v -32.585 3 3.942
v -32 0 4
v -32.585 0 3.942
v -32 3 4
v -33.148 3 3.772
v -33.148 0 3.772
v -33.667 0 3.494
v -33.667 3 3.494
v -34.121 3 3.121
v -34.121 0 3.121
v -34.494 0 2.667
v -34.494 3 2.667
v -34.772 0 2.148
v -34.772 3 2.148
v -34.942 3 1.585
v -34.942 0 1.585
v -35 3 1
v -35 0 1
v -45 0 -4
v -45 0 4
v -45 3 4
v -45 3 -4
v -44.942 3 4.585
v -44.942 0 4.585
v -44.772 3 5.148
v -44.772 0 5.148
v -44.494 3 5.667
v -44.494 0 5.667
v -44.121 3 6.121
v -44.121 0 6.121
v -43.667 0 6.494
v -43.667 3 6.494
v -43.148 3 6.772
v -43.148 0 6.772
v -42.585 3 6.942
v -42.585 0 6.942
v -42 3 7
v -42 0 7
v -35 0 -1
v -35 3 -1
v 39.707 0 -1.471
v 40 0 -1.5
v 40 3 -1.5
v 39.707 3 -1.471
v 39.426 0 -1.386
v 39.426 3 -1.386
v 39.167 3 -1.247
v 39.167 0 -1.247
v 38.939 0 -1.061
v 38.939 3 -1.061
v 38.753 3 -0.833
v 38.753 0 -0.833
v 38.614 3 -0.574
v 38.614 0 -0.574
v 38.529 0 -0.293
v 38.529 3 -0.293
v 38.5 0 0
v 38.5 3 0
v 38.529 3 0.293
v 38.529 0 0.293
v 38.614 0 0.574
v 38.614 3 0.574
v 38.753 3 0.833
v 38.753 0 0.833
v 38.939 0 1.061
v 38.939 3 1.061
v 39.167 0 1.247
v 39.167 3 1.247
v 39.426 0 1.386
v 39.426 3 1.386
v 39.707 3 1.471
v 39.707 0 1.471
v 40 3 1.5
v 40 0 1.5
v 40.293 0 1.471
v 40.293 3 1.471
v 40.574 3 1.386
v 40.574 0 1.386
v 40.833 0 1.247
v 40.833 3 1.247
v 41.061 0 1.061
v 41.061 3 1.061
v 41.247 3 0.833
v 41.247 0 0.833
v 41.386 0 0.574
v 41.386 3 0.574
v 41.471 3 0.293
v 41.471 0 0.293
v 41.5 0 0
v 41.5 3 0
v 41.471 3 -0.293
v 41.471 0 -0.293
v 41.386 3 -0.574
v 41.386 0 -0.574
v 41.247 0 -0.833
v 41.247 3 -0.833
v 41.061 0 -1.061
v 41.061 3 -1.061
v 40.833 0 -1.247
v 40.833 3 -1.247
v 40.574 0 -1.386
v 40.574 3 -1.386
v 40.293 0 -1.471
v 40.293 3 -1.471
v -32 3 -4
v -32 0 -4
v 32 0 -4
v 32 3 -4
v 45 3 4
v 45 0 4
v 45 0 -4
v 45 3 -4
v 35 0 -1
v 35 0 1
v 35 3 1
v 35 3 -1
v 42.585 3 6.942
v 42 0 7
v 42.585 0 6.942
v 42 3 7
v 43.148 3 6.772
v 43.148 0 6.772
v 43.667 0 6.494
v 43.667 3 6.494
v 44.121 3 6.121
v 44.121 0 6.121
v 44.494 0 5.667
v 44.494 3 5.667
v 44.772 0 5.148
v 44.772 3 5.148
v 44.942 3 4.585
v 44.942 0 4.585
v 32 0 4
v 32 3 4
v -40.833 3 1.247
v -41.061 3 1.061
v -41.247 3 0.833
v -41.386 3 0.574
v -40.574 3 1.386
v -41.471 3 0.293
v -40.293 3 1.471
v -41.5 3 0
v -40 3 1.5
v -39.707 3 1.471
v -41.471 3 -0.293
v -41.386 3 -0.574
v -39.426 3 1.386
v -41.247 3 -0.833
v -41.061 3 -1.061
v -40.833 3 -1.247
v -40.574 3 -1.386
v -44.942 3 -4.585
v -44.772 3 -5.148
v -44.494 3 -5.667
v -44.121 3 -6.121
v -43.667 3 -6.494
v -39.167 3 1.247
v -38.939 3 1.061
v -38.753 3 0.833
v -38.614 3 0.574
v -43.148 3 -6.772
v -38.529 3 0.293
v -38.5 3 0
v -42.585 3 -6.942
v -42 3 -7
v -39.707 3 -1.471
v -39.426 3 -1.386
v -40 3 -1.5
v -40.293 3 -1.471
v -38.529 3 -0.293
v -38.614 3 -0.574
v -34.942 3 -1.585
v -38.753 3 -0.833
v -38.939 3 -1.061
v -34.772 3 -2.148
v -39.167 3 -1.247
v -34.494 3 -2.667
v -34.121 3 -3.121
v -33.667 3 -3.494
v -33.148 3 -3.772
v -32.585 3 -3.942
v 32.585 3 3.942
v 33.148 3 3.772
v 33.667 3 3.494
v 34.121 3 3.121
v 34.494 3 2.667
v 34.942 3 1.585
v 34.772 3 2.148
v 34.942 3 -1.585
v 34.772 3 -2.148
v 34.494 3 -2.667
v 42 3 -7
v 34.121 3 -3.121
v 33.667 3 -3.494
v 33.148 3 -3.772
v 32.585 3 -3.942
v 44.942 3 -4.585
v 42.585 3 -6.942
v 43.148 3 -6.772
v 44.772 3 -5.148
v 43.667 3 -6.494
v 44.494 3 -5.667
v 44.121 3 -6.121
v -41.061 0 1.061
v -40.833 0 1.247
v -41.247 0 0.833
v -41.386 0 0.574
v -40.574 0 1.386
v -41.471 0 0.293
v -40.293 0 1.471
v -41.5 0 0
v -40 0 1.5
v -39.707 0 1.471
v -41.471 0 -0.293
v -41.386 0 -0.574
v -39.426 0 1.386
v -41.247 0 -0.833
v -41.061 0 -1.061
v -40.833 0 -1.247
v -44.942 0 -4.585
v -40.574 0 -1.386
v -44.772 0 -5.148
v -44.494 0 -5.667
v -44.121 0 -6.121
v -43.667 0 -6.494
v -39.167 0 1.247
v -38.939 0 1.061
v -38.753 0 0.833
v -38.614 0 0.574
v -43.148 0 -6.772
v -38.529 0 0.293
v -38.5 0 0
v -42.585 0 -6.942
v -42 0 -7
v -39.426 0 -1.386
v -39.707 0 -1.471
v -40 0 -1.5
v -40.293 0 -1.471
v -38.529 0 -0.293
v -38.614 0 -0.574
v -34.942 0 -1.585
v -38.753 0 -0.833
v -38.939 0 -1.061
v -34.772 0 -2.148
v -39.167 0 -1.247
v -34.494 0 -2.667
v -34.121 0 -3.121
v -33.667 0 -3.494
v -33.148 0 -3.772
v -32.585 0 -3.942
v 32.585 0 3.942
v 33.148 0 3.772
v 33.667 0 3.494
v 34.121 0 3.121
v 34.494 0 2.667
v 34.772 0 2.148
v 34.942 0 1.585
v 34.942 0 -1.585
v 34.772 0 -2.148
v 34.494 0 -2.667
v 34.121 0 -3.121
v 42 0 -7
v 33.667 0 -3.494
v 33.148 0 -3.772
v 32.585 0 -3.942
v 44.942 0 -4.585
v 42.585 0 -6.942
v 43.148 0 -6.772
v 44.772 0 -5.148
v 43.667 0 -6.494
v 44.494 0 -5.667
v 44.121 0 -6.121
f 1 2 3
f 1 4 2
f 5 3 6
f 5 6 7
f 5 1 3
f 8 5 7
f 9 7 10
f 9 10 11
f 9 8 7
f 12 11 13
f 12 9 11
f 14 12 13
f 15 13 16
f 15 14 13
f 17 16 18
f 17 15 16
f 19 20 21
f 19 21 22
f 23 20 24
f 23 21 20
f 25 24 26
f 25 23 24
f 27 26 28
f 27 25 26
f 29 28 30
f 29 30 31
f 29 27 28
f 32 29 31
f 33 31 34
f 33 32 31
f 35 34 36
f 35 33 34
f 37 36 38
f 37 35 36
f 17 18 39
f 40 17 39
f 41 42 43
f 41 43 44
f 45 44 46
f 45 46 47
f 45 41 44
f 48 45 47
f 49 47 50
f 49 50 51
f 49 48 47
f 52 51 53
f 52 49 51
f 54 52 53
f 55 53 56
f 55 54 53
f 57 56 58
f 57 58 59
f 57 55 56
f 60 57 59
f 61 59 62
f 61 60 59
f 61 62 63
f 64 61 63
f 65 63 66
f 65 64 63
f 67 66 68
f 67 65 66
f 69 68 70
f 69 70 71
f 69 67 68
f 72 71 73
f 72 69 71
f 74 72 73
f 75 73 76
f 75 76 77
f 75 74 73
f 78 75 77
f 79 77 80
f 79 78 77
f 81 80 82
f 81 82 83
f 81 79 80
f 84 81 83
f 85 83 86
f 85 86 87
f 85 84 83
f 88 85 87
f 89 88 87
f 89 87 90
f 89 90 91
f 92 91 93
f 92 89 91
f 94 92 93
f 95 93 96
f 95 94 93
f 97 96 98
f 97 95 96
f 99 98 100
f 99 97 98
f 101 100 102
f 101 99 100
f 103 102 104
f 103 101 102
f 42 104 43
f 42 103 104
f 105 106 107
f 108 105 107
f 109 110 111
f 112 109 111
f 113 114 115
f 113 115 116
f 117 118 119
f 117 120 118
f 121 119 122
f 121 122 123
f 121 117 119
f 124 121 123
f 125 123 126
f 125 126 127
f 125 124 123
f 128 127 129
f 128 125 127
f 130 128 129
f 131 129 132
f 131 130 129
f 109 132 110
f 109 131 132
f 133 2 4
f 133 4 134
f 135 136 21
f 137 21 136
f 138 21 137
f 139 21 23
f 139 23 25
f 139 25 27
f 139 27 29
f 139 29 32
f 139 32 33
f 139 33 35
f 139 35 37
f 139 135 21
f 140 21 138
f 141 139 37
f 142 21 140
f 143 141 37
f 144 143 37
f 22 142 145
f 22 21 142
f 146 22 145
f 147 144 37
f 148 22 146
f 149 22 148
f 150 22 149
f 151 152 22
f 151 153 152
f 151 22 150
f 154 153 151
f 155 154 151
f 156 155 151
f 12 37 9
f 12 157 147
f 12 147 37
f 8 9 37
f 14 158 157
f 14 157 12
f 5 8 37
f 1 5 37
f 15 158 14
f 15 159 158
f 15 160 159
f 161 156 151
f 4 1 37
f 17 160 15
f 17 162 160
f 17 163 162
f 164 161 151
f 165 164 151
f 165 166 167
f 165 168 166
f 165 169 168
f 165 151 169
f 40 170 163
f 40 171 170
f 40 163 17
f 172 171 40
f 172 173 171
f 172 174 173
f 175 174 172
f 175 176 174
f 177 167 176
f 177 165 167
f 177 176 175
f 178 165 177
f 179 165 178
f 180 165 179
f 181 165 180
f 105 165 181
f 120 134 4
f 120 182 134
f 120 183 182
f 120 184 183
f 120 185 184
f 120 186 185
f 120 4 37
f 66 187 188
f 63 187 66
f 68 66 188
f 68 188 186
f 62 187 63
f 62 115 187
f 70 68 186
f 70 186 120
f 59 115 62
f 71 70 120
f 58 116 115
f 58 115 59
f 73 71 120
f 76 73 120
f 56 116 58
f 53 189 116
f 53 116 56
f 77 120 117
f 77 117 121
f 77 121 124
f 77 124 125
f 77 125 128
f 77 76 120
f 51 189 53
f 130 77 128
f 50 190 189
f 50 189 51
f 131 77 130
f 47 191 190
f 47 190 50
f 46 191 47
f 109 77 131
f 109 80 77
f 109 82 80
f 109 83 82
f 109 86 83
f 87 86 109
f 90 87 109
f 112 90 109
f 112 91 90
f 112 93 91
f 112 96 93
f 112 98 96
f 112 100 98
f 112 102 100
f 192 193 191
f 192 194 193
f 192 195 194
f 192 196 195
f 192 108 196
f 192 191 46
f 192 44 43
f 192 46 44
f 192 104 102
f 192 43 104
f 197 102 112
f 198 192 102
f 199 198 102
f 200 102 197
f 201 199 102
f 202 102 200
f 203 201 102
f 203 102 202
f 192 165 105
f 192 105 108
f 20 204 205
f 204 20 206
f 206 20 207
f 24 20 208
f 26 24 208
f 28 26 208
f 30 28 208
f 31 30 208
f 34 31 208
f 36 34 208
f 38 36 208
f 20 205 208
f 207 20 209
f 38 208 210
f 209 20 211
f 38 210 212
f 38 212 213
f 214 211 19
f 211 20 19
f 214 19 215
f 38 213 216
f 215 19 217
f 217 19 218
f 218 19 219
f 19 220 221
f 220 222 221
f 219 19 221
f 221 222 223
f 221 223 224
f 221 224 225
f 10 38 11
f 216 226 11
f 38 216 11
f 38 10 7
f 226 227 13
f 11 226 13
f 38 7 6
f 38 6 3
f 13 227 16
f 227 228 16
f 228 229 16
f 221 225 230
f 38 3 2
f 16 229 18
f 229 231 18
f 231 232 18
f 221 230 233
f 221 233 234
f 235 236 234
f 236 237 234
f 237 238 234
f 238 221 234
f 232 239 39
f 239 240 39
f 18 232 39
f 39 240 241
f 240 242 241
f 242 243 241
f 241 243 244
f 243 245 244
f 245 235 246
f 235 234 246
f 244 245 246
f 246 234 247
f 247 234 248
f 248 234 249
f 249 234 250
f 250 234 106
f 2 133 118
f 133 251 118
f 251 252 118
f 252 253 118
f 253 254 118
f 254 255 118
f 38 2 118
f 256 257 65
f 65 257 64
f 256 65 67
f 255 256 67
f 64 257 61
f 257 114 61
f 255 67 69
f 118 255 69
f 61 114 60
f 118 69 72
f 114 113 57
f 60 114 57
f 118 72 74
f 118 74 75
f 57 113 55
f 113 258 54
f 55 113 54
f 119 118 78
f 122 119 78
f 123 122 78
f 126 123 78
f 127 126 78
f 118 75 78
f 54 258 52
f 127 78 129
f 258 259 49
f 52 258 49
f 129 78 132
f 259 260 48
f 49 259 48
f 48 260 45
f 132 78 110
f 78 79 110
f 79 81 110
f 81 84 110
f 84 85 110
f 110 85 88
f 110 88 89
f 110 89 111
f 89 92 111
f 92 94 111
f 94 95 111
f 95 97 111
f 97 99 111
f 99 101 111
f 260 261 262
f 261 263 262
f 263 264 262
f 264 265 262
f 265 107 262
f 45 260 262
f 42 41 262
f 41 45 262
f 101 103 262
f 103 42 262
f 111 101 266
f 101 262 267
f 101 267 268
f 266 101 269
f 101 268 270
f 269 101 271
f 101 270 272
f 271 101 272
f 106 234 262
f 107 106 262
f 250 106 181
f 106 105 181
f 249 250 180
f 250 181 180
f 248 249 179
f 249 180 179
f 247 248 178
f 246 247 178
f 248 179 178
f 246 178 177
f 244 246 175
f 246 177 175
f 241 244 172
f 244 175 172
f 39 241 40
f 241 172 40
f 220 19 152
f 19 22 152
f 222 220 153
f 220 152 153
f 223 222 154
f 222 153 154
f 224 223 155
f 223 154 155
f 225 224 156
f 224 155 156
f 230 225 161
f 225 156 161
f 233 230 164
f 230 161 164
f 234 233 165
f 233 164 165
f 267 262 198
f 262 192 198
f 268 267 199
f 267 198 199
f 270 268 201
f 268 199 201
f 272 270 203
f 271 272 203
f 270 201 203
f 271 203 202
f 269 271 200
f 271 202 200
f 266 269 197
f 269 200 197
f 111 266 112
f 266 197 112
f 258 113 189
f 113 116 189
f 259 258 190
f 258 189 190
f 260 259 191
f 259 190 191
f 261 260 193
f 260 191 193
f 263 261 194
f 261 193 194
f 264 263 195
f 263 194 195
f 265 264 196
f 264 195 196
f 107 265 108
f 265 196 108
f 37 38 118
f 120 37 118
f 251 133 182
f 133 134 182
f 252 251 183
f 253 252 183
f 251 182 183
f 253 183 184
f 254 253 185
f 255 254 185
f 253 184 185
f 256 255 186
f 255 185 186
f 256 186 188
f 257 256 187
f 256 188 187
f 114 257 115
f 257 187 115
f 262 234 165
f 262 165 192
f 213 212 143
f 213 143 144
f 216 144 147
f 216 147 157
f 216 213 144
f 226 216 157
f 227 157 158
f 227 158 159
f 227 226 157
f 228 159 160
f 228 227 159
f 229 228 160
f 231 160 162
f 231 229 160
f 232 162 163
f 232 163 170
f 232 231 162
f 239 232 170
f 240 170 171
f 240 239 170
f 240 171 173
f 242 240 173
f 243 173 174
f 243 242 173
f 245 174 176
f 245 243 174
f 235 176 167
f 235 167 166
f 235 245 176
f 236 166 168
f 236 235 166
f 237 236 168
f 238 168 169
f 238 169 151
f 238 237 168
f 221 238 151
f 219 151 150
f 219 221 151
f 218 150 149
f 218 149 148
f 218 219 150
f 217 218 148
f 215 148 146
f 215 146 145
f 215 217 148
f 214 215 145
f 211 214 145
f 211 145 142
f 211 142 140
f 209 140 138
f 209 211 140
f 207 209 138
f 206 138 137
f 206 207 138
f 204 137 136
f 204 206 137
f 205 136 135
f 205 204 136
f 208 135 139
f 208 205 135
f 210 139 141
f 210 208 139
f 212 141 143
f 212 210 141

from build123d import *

# Parameters (mm, degrees)
SKETCH_1_W      = 90
SKETCH_1_H      = 14
SKETCH_1_R      = 1.5
SKETCH_1_W_2    = 70
SKETCH_1_H_2    = 8
EXTRUDE_1_DEPTH = 3
FILLET_1_R      = 3


with BuildPart() as part:
    # 草图1 → 凸台-拉伸1 (new body)
    with BuildSketch(Plane(origin=(0, 0, 0), x_dir=(1, 0, 0), z_dir=(0, 1, 0))):
        Rectangle(SKETCH_1_W, SKETCH_1_H)
        with Locations(Location((-40, 0, 0), (0, 0, 270))):
            Circle(SKETCH_1_R, mode=Mode.SUBTRACT)
        with Locations(Location((40, 0, 0), (0, 0, 90))):
            Circle(SKETCH_1_R, mode=Mode.SUBTRACT)
        Rectangle(SKETCH_1_W_2, SKETCH_1_H_2, mode=Mode.SUBTRACT)
    extrude(amount=EXTRUDE_1_DEPTH)

    # 圆角1
    fillet_1_edges = [part.edges().sort_by_distance(p)[0] for p in [
        (35, 1.5, 4),
        (35, 1.5, -4),
        (-35, 1.5, -4),
        (-35, 1.5, 4),
        (45, 1.5, 7),
        (-45, 1.5, 7),
        (-45, 1.5, -7),
        (45, 1.5, -7),
    ]]
    fillet(fillet_1_edges, radius=FILLET_1_R)


solid = part.part
